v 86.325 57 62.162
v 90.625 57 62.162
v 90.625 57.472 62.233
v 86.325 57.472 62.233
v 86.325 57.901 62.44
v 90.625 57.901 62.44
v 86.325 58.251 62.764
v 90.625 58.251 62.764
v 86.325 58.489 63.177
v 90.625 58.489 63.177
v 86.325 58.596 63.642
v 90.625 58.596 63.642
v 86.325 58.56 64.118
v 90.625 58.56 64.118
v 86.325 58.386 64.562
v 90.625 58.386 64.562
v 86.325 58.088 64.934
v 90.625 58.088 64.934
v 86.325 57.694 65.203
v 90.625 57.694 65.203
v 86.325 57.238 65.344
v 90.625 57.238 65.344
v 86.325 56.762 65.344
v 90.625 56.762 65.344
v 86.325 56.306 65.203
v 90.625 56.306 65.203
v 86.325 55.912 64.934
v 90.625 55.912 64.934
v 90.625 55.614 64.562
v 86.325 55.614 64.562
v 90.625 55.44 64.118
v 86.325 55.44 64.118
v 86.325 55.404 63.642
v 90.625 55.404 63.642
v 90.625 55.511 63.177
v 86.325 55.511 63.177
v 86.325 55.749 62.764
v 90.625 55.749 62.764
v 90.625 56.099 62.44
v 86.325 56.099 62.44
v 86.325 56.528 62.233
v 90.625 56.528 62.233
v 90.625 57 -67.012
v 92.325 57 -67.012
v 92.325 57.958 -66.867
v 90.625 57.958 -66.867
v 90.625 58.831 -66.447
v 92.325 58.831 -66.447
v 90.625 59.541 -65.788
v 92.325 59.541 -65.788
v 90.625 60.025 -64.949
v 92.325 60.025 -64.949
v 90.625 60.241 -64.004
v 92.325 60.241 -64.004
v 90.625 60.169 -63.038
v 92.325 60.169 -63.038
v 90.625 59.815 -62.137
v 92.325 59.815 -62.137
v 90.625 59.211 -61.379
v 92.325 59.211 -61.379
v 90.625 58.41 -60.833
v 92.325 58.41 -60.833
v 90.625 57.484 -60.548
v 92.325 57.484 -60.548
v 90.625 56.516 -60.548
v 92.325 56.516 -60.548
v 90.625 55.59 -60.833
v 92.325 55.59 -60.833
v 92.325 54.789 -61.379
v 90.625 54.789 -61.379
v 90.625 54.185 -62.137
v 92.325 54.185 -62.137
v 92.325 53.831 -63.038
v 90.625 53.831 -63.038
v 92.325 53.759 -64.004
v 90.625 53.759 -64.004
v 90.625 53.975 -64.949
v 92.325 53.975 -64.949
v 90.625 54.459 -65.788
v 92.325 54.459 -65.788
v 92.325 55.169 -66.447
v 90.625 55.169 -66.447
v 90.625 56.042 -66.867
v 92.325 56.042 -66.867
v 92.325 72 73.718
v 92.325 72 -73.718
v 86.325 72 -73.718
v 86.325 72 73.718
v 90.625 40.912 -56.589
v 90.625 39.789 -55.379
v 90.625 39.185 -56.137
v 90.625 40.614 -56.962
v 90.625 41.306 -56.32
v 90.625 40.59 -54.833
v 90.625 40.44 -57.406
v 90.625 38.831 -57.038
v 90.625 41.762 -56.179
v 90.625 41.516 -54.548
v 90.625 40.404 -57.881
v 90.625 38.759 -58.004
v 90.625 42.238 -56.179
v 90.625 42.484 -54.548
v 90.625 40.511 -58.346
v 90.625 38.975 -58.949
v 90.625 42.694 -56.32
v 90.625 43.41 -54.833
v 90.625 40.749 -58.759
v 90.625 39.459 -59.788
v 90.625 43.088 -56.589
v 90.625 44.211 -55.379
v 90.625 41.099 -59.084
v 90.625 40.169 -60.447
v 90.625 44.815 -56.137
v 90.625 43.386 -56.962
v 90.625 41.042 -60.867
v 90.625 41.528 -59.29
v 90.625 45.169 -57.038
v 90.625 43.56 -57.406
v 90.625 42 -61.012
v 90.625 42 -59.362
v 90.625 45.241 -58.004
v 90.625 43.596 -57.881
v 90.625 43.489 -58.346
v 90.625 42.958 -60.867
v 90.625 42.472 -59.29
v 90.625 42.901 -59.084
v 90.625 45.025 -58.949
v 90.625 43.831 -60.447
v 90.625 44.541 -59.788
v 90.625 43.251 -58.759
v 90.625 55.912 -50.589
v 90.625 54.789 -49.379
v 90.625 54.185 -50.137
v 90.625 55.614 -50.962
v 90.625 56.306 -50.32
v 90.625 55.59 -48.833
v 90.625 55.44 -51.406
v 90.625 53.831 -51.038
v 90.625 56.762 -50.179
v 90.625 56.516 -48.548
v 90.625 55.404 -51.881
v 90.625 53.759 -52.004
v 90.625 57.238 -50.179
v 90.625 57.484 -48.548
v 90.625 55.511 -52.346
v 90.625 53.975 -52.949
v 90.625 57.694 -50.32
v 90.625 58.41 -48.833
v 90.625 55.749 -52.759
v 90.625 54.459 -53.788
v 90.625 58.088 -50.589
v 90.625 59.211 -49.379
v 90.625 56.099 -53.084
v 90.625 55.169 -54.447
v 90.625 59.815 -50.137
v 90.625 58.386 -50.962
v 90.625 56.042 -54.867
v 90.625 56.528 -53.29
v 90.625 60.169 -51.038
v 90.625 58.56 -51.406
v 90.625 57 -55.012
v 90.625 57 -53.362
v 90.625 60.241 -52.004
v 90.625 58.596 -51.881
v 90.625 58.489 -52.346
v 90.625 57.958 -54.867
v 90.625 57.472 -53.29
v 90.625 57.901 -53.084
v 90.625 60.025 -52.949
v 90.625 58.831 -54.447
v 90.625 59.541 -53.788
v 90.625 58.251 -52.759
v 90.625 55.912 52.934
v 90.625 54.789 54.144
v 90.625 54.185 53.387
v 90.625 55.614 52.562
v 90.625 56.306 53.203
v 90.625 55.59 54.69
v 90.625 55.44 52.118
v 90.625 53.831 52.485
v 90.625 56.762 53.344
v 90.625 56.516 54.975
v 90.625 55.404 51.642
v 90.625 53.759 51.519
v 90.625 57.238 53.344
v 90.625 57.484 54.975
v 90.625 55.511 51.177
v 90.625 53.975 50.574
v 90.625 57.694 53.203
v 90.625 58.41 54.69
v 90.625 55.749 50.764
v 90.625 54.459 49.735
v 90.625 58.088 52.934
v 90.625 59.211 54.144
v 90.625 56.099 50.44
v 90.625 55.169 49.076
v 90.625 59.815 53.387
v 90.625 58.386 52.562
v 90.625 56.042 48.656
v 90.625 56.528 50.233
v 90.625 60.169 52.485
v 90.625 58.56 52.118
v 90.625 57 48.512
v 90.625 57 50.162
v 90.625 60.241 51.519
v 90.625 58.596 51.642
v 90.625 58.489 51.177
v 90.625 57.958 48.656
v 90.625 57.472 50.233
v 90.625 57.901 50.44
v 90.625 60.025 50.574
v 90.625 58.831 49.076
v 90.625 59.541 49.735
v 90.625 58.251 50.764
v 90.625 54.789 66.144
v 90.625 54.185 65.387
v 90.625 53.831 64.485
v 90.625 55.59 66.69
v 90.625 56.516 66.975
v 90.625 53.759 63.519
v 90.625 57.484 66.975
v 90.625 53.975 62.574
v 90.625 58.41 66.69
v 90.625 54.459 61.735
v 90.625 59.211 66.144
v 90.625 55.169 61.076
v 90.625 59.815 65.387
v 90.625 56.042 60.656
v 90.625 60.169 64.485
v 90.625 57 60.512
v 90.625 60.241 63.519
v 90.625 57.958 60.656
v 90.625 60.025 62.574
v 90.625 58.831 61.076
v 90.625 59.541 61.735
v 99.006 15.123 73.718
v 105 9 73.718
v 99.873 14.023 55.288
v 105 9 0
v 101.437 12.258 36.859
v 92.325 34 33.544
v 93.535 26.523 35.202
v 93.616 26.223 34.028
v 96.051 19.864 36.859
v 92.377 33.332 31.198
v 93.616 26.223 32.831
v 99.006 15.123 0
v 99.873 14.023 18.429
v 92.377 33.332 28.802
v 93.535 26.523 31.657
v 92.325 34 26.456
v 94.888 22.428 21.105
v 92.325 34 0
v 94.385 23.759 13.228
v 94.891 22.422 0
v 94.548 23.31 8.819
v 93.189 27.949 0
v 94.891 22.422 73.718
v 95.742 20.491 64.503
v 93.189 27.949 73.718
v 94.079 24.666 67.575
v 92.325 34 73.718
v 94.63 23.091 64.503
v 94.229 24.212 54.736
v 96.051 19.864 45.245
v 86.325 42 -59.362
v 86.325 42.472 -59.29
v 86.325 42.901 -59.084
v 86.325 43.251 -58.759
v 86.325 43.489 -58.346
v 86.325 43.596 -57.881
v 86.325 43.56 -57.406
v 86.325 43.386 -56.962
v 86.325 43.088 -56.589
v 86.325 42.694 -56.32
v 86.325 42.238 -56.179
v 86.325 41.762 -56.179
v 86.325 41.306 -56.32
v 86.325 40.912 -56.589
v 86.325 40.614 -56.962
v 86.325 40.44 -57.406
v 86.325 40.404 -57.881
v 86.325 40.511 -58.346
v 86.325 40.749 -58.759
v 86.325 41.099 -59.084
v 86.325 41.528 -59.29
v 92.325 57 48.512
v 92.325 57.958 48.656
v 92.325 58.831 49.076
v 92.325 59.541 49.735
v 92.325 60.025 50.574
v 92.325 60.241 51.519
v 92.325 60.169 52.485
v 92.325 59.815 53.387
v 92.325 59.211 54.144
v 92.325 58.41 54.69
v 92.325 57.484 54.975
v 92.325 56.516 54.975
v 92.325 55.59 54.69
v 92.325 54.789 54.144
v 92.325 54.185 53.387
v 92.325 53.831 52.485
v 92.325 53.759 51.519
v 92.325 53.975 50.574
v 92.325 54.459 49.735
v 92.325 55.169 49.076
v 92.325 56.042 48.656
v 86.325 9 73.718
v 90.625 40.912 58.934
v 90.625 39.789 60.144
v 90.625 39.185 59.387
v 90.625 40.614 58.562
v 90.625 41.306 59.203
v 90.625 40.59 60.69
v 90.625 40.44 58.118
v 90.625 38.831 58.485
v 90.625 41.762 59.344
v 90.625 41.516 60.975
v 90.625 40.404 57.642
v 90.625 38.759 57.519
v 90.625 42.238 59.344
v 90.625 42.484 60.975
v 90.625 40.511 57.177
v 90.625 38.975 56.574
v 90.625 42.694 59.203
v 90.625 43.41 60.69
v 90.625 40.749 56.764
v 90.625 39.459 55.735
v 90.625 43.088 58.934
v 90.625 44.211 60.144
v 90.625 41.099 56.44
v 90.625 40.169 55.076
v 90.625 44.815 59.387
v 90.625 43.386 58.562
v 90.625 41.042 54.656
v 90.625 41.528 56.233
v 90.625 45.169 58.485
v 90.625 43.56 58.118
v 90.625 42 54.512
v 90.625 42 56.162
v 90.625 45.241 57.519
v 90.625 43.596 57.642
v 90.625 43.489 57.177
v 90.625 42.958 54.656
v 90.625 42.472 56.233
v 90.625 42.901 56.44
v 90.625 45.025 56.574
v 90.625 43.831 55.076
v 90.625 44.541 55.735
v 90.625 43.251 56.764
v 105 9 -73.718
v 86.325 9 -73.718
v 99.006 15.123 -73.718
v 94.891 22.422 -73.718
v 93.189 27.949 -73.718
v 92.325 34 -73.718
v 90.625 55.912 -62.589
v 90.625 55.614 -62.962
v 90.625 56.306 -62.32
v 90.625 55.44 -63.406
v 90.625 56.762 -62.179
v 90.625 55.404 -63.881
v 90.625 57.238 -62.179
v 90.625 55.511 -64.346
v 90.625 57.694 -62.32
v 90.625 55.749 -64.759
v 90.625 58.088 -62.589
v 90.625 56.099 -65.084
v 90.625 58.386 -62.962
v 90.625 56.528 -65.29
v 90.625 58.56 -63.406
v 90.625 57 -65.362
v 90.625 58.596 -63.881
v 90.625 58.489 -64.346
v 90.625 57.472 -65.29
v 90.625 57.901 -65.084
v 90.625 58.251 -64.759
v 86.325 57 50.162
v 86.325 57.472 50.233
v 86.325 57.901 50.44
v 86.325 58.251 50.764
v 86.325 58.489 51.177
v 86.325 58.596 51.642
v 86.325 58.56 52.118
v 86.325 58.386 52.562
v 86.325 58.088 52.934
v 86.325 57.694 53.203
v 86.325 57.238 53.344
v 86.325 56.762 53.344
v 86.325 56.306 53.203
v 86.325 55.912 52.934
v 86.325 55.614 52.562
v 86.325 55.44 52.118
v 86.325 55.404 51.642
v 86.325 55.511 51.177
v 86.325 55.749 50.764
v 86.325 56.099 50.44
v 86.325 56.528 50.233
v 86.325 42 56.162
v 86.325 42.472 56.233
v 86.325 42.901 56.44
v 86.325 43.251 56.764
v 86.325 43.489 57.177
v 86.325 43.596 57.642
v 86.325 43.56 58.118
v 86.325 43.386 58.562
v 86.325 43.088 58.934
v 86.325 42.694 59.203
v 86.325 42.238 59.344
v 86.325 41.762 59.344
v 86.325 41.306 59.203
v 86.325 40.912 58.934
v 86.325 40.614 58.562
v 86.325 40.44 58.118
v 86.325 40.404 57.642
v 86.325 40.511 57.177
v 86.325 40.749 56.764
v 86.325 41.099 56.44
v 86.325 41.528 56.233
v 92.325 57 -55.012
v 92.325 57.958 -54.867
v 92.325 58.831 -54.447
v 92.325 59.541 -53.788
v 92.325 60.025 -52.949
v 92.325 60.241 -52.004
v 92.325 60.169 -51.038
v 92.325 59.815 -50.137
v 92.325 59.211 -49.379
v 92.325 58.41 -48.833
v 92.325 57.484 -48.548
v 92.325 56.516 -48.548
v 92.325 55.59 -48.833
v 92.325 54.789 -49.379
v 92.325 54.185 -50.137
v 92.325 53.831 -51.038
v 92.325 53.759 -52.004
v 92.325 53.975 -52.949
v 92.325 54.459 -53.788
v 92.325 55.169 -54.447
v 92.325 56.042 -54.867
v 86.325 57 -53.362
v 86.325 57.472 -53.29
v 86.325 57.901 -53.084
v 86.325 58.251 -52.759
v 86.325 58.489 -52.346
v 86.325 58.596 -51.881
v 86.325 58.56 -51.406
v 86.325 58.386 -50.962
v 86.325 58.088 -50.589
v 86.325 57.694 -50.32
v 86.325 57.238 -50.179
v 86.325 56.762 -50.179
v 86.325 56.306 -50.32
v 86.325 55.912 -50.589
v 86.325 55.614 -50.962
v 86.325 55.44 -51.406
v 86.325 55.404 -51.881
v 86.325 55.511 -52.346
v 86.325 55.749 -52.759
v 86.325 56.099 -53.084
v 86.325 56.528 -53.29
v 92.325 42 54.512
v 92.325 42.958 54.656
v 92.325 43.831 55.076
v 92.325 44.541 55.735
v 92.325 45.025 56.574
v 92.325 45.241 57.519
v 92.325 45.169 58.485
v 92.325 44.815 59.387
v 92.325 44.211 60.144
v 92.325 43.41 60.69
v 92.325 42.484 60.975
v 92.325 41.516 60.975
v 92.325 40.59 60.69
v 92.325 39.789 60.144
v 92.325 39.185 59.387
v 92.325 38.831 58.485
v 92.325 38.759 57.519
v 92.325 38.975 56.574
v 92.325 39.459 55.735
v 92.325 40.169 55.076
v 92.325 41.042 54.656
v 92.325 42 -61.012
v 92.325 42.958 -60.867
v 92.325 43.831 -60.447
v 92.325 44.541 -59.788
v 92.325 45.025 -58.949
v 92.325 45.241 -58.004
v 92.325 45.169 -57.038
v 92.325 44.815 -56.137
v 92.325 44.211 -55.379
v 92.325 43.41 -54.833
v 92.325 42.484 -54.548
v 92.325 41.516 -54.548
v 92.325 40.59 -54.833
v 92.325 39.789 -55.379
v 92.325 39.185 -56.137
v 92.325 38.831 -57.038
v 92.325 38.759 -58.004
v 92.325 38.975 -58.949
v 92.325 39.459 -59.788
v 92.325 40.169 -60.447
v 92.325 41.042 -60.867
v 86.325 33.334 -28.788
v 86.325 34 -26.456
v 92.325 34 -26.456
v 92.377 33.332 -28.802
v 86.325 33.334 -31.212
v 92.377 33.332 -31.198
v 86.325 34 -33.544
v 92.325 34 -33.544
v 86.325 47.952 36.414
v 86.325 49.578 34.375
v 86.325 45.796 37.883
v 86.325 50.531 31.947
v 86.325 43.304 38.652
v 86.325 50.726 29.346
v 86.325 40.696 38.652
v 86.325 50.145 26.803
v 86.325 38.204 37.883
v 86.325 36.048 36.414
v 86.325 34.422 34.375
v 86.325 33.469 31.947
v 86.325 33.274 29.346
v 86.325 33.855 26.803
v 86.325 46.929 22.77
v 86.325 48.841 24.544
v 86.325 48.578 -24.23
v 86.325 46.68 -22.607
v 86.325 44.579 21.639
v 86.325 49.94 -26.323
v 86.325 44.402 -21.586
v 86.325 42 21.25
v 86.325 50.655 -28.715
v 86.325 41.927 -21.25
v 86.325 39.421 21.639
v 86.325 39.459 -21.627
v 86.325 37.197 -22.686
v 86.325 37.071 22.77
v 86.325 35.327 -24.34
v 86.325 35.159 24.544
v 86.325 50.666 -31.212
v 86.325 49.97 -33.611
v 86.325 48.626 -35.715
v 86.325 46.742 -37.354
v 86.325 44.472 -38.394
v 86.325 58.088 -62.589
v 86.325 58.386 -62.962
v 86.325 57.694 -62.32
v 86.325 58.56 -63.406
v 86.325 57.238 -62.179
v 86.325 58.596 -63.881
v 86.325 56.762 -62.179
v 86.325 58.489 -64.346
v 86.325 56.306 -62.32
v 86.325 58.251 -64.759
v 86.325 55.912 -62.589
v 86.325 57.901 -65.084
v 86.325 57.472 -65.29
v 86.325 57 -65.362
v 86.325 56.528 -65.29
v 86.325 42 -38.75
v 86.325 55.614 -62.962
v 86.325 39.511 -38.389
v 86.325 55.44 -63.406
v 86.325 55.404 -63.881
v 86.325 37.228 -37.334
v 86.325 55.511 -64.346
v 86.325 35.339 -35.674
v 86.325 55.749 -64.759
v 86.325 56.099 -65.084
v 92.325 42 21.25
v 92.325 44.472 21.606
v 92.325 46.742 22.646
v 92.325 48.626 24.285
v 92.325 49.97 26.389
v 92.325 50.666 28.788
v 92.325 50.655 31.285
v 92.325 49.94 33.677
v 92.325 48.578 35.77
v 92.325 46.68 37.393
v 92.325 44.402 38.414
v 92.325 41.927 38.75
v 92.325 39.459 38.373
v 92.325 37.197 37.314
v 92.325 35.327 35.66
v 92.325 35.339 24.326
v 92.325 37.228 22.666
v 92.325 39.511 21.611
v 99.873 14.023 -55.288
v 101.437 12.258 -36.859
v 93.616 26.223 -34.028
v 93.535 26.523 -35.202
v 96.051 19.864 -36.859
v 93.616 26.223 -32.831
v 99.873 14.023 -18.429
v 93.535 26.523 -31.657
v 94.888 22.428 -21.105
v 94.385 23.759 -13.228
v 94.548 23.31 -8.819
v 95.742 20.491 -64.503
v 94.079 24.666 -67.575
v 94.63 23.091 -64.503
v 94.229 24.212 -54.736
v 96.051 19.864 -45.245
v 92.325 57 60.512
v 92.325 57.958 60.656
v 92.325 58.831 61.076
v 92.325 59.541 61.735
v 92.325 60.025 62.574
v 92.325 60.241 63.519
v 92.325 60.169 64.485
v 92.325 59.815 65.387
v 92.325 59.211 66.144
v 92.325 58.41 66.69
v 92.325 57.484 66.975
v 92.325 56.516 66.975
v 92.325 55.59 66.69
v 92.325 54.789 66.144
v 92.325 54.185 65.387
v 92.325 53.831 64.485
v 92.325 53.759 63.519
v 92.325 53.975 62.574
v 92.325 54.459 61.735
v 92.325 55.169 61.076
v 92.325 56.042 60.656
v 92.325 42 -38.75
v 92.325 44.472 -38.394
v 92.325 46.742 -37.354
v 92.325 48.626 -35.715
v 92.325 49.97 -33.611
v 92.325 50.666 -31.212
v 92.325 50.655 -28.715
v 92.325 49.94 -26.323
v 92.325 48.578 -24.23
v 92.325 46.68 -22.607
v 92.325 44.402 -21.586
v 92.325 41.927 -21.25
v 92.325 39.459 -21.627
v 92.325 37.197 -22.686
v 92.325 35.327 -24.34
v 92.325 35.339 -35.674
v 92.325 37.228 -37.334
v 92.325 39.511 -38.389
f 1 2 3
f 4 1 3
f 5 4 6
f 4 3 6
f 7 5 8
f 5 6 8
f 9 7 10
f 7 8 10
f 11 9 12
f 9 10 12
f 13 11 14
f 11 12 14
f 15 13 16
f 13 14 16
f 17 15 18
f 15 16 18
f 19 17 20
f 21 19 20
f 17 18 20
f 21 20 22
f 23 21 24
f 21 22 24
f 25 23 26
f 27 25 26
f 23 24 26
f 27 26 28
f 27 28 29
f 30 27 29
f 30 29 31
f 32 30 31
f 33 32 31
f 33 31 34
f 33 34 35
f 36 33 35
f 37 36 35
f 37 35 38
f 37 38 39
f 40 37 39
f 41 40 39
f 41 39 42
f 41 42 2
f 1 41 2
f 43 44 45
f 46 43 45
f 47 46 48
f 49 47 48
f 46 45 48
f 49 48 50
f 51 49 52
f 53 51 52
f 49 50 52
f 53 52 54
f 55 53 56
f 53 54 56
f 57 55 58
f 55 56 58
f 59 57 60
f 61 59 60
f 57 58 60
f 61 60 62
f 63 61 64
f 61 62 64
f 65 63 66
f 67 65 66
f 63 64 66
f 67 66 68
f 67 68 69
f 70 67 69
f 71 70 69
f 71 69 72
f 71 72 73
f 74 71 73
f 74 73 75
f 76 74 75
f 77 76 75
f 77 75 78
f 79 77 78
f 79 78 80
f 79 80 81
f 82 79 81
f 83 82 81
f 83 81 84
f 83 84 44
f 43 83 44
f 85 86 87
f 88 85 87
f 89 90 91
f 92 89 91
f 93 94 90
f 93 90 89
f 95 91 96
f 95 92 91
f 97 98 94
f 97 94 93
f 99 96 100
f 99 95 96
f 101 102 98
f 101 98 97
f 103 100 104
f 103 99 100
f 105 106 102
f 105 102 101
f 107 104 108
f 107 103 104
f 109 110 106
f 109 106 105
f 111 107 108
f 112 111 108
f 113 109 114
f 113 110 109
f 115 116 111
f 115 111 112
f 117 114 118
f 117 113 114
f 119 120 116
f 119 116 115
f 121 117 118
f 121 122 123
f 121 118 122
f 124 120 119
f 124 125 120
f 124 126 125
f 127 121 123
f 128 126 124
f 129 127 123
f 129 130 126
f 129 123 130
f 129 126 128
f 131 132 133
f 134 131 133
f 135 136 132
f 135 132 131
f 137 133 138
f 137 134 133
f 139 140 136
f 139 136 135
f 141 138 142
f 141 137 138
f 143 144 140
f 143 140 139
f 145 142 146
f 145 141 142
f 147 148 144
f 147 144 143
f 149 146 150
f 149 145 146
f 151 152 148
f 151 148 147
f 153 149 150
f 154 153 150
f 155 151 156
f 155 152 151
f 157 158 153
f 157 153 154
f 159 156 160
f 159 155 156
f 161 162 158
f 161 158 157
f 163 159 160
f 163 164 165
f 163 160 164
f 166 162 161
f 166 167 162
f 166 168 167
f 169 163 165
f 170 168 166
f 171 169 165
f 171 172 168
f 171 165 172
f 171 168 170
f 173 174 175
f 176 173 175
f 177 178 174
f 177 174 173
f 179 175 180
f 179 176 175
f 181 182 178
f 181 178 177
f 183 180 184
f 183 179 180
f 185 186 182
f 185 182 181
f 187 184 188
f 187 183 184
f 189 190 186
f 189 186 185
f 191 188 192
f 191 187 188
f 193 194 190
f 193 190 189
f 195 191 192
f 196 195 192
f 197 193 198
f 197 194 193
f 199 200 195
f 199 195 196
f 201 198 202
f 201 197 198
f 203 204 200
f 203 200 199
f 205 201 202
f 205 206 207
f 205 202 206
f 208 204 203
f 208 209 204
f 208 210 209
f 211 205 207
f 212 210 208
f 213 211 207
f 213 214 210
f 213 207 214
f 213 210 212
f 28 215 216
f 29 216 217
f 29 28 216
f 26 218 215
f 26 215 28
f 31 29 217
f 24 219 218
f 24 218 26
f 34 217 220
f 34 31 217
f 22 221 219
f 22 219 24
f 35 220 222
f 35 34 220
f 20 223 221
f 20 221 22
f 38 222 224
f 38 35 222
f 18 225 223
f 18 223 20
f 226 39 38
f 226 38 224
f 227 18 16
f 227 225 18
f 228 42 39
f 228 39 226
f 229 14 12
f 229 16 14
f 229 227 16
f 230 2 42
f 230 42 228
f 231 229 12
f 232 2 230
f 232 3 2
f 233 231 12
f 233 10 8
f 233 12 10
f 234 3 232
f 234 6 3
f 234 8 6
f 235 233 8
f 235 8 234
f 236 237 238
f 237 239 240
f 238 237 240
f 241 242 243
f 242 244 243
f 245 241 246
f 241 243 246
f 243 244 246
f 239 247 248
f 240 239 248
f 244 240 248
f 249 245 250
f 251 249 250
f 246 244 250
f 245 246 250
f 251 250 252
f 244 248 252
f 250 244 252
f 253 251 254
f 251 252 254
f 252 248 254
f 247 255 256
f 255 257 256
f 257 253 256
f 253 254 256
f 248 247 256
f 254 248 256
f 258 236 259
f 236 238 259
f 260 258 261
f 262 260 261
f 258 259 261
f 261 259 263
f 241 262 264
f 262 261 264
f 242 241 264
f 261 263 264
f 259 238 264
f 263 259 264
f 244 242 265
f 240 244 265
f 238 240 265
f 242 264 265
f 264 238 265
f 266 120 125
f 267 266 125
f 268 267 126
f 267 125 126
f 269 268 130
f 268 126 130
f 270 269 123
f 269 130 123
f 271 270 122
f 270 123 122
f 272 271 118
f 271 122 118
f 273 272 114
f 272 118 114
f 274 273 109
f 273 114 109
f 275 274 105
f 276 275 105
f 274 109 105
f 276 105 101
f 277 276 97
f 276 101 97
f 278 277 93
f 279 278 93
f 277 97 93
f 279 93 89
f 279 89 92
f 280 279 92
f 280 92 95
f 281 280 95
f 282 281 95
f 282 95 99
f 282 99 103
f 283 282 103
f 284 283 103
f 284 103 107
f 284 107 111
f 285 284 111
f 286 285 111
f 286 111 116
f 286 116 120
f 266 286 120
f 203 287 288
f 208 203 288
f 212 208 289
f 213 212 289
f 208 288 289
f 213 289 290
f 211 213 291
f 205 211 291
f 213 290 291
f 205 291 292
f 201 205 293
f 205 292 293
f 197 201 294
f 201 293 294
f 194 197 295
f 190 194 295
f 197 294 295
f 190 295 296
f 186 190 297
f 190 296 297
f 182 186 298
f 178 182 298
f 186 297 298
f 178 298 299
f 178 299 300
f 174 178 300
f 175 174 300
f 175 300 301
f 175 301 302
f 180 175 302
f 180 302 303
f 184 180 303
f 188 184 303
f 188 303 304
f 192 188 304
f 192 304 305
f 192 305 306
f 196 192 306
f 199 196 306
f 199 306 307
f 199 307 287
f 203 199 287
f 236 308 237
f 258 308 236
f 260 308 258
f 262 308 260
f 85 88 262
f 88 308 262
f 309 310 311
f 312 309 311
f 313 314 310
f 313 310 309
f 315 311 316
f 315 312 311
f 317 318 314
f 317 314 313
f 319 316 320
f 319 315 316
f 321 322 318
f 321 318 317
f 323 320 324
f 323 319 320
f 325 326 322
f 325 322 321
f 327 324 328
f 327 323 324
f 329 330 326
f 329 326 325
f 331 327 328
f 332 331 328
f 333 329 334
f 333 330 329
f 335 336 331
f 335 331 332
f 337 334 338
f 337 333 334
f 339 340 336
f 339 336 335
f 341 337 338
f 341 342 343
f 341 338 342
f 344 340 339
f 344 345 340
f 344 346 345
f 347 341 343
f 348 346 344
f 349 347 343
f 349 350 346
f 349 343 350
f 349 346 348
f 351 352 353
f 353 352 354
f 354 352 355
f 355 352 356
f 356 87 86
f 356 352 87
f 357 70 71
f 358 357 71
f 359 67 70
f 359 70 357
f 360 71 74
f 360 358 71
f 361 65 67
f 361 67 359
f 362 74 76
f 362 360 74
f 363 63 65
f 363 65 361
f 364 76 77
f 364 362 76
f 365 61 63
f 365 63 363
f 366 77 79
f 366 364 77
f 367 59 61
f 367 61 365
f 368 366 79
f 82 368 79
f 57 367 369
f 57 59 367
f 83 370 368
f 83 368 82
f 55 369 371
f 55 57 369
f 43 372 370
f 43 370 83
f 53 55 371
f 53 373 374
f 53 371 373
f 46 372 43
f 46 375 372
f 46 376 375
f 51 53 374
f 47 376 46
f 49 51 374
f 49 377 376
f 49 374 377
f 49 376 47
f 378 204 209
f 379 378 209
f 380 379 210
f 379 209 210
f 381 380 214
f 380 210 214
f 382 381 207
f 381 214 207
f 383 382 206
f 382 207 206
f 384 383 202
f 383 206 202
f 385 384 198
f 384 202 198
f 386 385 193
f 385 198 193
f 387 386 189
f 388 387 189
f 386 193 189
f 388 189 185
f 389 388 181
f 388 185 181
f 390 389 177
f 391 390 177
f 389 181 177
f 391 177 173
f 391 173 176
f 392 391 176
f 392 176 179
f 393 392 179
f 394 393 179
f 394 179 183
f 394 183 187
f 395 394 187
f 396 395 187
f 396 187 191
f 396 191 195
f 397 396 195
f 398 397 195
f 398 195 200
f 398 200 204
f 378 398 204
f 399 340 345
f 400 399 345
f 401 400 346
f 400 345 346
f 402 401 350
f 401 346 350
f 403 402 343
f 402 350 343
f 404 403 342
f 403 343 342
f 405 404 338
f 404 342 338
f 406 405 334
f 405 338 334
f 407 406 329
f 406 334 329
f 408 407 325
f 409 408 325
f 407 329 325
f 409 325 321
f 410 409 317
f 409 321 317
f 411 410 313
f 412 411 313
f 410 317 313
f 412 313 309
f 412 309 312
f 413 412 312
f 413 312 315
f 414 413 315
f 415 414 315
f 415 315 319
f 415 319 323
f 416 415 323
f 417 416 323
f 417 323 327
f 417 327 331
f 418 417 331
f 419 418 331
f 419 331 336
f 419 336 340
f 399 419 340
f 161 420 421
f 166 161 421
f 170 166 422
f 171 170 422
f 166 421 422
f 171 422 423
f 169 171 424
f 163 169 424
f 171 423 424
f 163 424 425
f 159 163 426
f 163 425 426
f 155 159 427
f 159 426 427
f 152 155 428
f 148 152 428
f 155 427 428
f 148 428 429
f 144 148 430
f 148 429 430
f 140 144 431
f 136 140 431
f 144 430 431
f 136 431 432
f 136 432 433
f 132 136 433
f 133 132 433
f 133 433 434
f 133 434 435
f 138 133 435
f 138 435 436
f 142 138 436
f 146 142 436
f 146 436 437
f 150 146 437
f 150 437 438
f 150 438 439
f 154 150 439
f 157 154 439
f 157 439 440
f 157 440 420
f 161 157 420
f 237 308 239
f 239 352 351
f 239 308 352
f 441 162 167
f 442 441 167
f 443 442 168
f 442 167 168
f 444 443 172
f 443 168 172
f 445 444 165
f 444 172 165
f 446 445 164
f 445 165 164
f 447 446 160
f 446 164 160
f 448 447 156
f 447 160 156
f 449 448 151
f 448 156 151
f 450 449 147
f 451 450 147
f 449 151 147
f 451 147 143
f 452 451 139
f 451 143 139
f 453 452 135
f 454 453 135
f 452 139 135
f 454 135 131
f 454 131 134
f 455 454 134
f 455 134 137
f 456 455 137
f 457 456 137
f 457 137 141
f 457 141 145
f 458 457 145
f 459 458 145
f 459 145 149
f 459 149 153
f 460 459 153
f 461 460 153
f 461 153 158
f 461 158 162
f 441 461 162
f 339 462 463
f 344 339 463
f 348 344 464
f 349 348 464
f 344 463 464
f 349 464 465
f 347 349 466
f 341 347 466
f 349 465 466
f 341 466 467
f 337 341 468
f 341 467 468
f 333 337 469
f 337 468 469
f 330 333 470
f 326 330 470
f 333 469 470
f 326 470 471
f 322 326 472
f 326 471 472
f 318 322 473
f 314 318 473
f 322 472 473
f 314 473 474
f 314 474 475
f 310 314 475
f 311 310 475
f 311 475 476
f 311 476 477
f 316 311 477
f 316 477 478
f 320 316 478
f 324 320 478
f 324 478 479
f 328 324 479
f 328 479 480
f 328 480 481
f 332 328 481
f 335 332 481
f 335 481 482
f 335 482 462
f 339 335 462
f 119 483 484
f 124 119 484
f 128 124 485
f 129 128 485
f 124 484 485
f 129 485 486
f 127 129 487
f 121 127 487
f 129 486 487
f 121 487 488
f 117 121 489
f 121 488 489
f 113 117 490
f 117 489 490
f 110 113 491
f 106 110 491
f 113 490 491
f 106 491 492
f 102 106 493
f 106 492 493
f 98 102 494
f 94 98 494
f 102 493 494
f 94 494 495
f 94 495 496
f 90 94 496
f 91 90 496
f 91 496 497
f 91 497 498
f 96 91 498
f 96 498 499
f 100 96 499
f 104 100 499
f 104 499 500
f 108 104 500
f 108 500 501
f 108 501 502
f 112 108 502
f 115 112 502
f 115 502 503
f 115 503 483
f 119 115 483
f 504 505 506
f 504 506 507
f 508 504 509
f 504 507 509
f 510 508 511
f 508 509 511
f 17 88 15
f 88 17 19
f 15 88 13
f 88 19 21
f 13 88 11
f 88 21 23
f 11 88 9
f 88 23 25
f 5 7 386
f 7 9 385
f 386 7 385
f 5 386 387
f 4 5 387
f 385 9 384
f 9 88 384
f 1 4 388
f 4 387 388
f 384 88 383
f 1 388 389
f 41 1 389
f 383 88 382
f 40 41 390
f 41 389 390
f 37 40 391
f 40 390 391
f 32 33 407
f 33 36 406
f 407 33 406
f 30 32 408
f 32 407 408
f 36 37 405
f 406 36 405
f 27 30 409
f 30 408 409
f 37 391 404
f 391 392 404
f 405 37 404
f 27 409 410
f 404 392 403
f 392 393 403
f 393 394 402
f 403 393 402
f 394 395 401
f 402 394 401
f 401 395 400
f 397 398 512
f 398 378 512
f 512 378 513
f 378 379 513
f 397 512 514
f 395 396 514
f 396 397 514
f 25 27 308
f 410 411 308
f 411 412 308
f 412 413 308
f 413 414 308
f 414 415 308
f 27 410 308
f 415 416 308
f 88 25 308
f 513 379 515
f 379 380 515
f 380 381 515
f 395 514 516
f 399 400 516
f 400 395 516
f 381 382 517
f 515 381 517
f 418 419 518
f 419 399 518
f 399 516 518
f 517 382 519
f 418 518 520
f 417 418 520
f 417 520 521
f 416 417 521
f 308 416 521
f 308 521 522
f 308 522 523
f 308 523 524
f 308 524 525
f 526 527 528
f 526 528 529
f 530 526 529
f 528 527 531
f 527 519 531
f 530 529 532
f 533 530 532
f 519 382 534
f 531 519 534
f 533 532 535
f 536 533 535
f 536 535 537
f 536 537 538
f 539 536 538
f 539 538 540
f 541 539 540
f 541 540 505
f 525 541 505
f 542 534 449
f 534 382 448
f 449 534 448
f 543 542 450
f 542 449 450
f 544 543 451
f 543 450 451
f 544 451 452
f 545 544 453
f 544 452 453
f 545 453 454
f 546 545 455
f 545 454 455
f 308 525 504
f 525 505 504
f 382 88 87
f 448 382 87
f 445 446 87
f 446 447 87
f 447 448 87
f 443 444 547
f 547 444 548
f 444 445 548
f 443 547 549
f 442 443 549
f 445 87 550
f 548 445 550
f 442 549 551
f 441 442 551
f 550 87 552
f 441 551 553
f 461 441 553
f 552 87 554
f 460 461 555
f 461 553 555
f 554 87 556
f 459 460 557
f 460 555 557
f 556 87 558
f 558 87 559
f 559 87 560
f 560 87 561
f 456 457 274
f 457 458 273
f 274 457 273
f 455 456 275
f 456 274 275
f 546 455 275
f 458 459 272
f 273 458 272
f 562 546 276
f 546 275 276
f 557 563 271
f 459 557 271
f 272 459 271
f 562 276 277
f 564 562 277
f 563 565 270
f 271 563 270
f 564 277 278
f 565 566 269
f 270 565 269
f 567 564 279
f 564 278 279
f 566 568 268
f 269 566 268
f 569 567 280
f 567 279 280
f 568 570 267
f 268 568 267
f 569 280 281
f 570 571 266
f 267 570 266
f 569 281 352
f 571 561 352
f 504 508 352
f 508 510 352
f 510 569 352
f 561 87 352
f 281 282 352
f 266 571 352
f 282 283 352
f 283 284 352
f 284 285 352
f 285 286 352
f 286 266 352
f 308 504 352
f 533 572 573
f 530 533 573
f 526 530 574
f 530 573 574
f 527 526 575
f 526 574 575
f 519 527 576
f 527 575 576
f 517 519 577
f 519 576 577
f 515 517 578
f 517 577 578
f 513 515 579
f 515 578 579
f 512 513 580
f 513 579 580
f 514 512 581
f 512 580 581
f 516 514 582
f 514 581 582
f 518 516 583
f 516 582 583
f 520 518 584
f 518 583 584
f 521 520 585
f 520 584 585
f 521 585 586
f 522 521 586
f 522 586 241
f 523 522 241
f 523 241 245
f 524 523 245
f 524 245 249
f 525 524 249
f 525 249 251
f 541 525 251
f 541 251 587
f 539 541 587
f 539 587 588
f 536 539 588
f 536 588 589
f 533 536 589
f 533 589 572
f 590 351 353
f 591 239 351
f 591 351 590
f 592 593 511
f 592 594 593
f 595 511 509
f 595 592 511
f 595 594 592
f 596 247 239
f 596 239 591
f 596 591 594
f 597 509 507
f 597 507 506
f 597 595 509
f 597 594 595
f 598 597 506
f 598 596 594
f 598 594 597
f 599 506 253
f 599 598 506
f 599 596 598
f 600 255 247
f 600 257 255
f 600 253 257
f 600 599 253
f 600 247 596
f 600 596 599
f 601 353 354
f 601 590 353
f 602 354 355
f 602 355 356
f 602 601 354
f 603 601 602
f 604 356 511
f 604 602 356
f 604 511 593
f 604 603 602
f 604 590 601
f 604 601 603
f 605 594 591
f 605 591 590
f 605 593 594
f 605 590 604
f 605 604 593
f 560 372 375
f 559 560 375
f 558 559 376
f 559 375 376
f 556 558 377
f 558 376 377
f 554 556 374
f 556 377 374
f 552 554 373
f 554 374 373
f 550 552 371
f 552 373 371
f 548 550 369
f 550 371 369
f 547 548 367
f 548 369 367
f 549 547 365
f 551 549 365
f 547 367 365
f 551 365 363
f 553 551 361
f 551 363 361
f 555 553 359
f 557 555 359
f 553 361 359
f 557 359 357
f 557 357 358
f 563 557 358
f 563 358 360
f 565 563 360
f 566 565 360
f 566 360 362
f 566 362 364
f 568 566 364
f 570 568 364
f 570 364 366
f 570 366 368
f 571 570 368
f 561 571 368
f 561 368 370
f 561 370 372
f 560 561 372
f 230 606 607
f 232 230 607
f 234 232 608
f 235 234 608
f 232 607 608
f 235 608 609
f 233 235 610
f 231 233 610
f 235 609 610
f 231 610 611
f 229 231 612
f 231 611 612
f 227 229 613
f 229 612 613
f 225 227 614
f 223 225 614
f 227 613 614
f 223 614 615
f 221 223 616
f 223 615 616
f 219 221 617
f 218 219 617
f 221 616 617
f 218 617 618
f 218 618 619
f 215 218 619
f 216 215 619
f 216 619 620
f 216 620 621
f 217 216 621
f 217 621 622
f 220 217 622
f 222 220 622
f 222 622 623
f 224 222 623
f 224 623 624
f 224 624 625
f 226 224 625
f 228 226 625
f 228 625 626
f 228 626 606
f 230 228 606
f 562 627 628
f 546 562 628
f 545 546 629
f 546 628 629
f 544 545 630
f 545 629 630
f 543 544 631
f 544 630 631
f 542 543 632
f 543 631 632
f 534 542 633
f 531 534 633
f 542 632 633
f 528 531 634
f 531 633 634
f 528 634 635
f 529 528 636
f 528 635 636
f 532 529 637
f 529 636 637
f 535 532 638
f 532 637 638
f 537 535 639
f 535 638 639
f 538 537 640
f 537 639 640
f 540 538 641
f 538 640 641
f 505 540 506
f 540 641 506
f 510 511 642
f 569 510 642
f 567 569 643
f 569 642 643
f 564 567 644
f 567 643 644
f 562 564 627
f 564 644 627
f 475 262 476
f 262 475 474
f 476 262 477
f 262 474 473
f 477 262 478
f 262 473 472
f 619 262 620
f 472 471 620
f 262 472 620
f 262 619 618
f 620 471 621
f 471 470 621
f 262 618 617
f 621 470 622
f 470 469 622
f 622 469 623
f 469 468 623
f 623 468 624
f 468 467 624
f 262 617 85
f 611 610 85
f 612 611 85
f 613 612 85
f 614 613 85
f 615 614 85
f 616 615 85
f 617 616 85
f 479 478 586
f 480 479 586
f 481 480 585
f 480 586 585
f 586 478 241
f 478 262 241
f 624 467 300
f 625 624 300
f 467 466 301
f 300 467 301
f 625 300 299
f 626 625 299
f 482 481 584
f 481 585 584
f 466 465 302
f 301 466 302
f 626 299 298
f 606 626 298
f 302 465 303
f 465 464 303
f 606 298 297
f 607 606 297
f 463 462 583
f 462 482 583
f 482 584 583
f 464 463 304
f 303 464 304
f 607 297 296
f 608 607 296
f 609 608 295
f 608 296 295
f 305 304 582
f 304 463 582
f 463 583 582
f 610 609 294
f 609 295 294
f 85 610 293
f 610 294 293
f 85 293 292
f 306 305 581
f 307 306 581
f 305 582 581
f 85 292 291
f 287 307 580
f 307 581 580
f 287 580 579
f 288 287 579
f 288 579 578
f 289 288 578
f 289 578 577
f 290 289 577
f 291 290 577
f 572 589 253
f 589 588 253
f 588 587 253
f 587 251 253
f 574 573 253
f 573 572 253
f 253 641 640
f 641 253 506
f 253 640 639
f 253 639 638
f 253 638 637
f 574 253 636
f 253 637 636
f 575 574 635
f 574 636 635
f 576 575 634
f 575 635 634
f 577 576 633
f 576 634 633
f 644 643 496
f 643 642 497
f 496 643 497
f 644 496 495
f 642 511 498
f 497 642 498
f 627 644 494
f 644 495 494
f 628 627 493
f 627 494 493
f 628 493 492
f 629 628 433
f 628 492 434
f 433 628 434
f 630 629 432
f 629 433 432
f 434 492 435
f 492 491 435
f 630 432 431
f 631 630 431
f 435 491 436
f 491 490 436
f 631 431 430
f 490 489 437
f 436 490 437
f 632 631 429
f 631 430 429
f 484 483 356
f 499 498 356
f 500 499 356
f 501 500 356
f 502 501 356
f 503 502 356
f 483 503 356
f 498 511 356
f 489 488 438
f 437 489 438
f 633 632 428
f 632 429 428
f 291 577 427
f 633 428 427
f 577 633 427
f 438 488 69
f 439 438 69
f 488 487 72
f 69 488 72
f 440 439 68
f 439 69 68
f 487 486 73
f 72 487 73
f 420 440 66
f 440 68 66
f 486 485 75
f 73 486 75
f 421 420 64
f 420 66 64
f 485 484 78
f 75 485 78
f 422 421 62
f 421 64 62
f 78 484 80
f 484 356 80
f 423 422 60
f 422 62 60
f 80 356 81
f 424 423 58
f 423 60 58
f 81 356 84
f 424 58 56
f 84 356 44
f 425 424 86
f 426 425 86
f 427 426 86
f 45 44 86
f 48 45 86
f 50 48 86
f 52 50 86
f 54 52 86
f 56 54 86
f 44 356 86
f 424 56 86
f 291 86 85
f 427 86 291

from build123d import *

# Parameters (mm, degrees)
SALIENTE_EXTRUIR1_DEPTH           = 73.717911
CORTAR_EXTRUIR1_REACH             = 8
CROQUIS3_R                        = 8.75
CORTAR_EXTRUIR1_DIRECTION_2_DEPTH = 0.4
CORTAR_EXTRUIR2_REACH             = 8
CROQUIS4_R                        = 1.6
CORTAR_EXTRUIR2_DIRECTION_2_DEPTH = 0.4
CROQUIS5_R                        = 3.25
CORTAR_EXTRUIR3_DEPTH             = 2.5


with BuildPart() as part:
    # Croquis1 → Saliente-Extruir1 (new body)
    with BuildSketch(Plane.XY):
        with BuildLine():
            Line((86.324875029, 72), (86.324875029, 9))
            Line((86.324875029, 9), (105, 9))
            add(Edge.make_bspline(
                [(105, 9), (93.439731725, 18.227197661), (92.324875029, 34)],
                knots=[0, 0, 0, 1, 1, 1], degree=2))
            Line((92.324875029, 34), (92.324875029, 72))
            Line((92.324875029, 72), (86.324875029, 72))
        make_face()
    saliente_extruir1 = extrude(amount=-SALIENTE_EXTRUIR1_DEPTH)

    # Simetr_a1: Saliente-Extruir1 across Front Plane
    add(saliente_extruir1.mirror(Plane.XY))

    # Croquis3 → Cortar-Extruir1 (cut, up to next)
    with BuildSketch(Plane(origin=(92.324875029, 0, 0), x_dir=(0, 0, -1), z_dir=(1, 0, 0)), mode=Mode.PRIVATE) as cortar_extruir1_sk1:
        with BuildLine():
            Line((33.54436172, 34), (26.45563828, 34))
            ThreePointArc((26.45563828, 34), (30, 33.25), (33.54436172, 34))
        make_face()
    cortar_extruir1_tool1 = extrude(cortar_extruir1_sk1.sketch, amount=-CORTAR_EXTRUIR1_REACH, mode=Mode.PRIVATE) & part.part
    add(cortar_extruir1_tool1.solids().sort_by_distance((92.324875, 33.69887, -30))[0], mode=Mode.SUBTRACT)
    # Croquis3 → Cortar-Extruir1 (cut, up to next)
    with BuildSketch(Plane(origin=(92.324875029, 0, 0), x_dir=(0, 0, -1), z_dir=(1, 0, 0)), mode=Mode.PRIVATE) as cortar_extruir1_sk2:
        with BuildLine():
            ThreePointArc((38.75, 42), (25.227718839, 49.334018852), (26.45563828, 34))
            Line((26.45563828, 34), (33.54436172, 34))
            ThreePointArc((33.54436172, 34), (37.334018852, 37.227718839), (38.75, 42))
        make_face()
    cortar_extruir1_tool2 = extrude(cortar_extruir1_sk2.sketch, amount=-CORTAR_EXTRUIR1_REACH, mode=Mode.PRIVATE) & part.part
    add(cortar_extruir1_tool2.solids().sort_by_distance((92.324875, 42.125274, -30))[0], mode=Mode.SUBTRACT)
    # Croquis3 → Cortar-Extruir1 (cut, up to next)
    with BuildSketch(Plane(origin=(92.324875029, 0, 0), x_dir=(0, 0, -1), z_dir=(1, 0, 0)), mode=Mode.PRIVATE) as cortar_extruir1_sk3:
        with Locations((-30, 42)):
            Circle(CROQUIS3_R)
    cortar_extruir1_tool3 = extrude(cortar_extruir1_sk3.sketch, amount=-CORTAR_EXTRUIR1_REACH, mode=Mode.PRIVATE) & part.part
    add(cortar_extruir1_tool3.solids().sort_by_distance((92.324875, 42, 30))[0], mode=Mode.SUBTRACT)

    # Croquis3 → Cortar-Extruir1 direction 2 (cut)
    with BuildSketch(Plane(origin=(92.324875029, 0, 0), x_dir=(0, 0, -1), z_dir=(1, 0, 0))):
        with BuildLine():
            Line((33.54436172, 34), (26.45563828, 34))
            ThreePointArc((26.45563828, 34), (30, 33.25), (33.54436172, 34))
        make_face()
        with BuildLine():
            ThreePointArc((38.75, 42), (25.227718839, 49.334018852), (26.45563828, 34))
            Line((26.45563828, 34), (33.54436172, 34))
            ThreePointArc((33.54436172, 34), (37.334018852, 37.227718839), (38.75, 42))
        make_face()
        with Locations((-30, 42)):
            Circle(CROQUIS3_R)
    extrude(amount=CORTAR_EXTRUIR1_DIRECTION_2_DEPTH, mode=Mode.SUBTRACT)

    # Croquis4 → Cortar-Extruir2 (cut, up to next)
    with BuildSketch(Plane(origin=(92.324875029, 0, 0), x_dir=(0, 0, -1), z_dir=(1, 0, 0)), mode=Mode.PRIVATE) as cortar_extruir2_sk1:
        with Locations((-57.761533754, 42)):
            Circle(CROQUIS4_R)
    cortar_extruir2_tool1 = extrude(cortar_extruir2_sk1.sketch, amount=-CORTAR_EXTRUIR2_REACH, mode=Mode.PRIVATE) & part.part
    add(cortar_extruir2_tool1.solids().sort_by_distance((92.324875, 42, 57.761534))[0], mode=Mode.SUBTRACT)
    # Croquis4 → Cortar-Extruir2 (cut, up to next)
    with BuildSketch(Plane(origin=(92.324875029, 0, 0), x_dir=(0, 0, -1), z_dir=(1, 0, 0)), mode=Mode.PRIVATE) as cortar_extruir2_sk2:
        with Locations((-63.761533754, 57)):
            Circle(CROQUIS4_R)
    cortar_extruir2_tool2 = extrude(cortar_extruir2_sk2.sketch, amount=-CORTAR_EXTRUIR2_REACH, mode=Mode.PRIVATE) & part.part
    add(cortar_extruir2_tool2.solids().sort_by_distance((92.324875, 57, 63.761534))[0], mode=Mode.SUBTRACT)
    # Croquis4 → Cortar-Extruir2 (cut, up to next)
    with BuildSketch(Plane(origin=(92.324875029, 0, 0), x_dir=(0, 0, -1), z_dir=(1, 0, 0)), mode=Mode.PRIVATE) as cortar_extruir2_sk3:
        with Locations((-51.761533754, 57)):
            Circle(CROQUIS4_R)
    cortar_extruir2_tool3 = extrude(cortar_extruir2_sk3.sketch, amount=-CORTAR_EXTRUIR2_REACH, mode=Mode.PRIVATE) & part.part
    add(cortar_extruir2_tool3.solids().sort_by_distance((92.324875, 57, 51.761534))[0], mode=Mode.SUBTRACT)
    # Croquis4 → Cortar-Extruir2 (cut, up to next)
    with BuildSketch(Plane(origin=(92.324875029, 0, 0), x_dir=(0, 0, -1), z_dir=(1, 0, 0)), mode=Mode.PRIVATE) as cortar_extruir2_sk4:
        with Locations((51.761533754, 57)):
            Circle(CROQUIS4_R)
    cortar_extruir2_tool4 = extrude(cortar_extruir2_sk4.sketch, amount=-CORTAR_EXTRUIR2_REACH, mode=Mode.PRIVATE) & part.part
    add(cortar_extruir2_tool4.solids().sort_by_distance((92.324875, 57, -51.761534))[0], mode=Mode.SUBTRACT)
    # Croquis4 → Cortar-Extruir2 (cut, up to next)
    with BuildSketch(Plane(origin=(92.324875029, 0, 0), x_dir=(0, 0, -1), z_dir=(1, 0, 0)), mode=Mode.PRIVATE) as cortar_extruir2_sk5:
        with Locations((63.761533754, 57)):
            Circle(CROQUIS4_R)
    cortar_extruir2_tool5 = extrude(cortar_extruir2_sk5.sketch, amount=-CORTAR_EXTRUIR2_REACH, mode=Mode.PRIVATE) & part.part
    add(cortar_extruir2_tool5.solids().sort_by_distance((92.324875, 57, -63.761534))[0], mode=Mode.SUBTRACT)
    # Croquis4 → Cortar-Extruir2 (cut, up to next)
    with BuildSketch(Plane(origin=(92.324875029, 0, 0), x_dir=(0, 0, -1), z_dir=(1, 0, 0)), mode=Mode.PRIVATE) as cortar_extruir2_sk6:
        with Locations((57.761533754, 42)):
            Circle(CROQUIS4_R)
    cortar_extruir2_tool6 = extrude(cortar_extruir2_sk6.sketch, amount=-CORTAR_EXTRUIR2_REACH, mode=Mode.PRIVATE) & part.part
    add(cortar_extruir2_tool6.solids().sort_by_distance((92.324875, 42, -57.761534))[0], mode=Mode.SUBTRACT)

    # Croquis4 → Cortar-Extruir2 direction 2 (cut)
    with BuildSketch(Plane(origin=(92.324875029, 0, 0), x_dir=(0, 0, -1), z_dir=(1, 0, 0))):
        with Locations((-57.761533754, 42)):
            Circle(CROQUIS4_R)
        with Locations((-63.761533754, 57)):
            Circle(CROQUIS4_R)
        with Locations((-51.761533754, 57)):
            Circle(CROQUIS4_R)
        with Locations((51.761533754, 57)):
            Circle(CROQUIS4_R)
        with Locations((63.761533754, 57)):
            Circle(CROQUIS4_R)
        with Locations((57.761533754, 42)):
            Circle(CROQUIS4_R)
    extrude(amount=CORTAR_EXTRUIR2_DIRECTION_2_DEPTH, mode=Mode.SUBTRACT)

    # Croquis5 → Cortar-Extruir3 (cut)
    with BuildSketch(Plane(origin=(93.124875029, 0, 0), x_dir=(0, 0, -1), z_dir=(1, 0, 0))):
        with Locations((-57.761533754, 42)):
            Circle(CROQUIS5_R)
        with Locations((-63.761533754, 57)):
            Circle(CROQUIS5_R)
        with Locations((-51.761533754, 57)):
            Circle(CROQUIS5_R)
        with Locations((51.761533754, 57)):
            Circle(CROQUIS5_R)
        with Locations((63.761533754, 57)):
            Circle(CROQUIS5_R)
        with Locations((57.761533754, 42)):
            Circle(CROQUIS5_R)
    extrude(amount=-CORTAR_EXTRUIR3_DEPTH, mode=Mode.SUBTRACT)


solid = part.part
